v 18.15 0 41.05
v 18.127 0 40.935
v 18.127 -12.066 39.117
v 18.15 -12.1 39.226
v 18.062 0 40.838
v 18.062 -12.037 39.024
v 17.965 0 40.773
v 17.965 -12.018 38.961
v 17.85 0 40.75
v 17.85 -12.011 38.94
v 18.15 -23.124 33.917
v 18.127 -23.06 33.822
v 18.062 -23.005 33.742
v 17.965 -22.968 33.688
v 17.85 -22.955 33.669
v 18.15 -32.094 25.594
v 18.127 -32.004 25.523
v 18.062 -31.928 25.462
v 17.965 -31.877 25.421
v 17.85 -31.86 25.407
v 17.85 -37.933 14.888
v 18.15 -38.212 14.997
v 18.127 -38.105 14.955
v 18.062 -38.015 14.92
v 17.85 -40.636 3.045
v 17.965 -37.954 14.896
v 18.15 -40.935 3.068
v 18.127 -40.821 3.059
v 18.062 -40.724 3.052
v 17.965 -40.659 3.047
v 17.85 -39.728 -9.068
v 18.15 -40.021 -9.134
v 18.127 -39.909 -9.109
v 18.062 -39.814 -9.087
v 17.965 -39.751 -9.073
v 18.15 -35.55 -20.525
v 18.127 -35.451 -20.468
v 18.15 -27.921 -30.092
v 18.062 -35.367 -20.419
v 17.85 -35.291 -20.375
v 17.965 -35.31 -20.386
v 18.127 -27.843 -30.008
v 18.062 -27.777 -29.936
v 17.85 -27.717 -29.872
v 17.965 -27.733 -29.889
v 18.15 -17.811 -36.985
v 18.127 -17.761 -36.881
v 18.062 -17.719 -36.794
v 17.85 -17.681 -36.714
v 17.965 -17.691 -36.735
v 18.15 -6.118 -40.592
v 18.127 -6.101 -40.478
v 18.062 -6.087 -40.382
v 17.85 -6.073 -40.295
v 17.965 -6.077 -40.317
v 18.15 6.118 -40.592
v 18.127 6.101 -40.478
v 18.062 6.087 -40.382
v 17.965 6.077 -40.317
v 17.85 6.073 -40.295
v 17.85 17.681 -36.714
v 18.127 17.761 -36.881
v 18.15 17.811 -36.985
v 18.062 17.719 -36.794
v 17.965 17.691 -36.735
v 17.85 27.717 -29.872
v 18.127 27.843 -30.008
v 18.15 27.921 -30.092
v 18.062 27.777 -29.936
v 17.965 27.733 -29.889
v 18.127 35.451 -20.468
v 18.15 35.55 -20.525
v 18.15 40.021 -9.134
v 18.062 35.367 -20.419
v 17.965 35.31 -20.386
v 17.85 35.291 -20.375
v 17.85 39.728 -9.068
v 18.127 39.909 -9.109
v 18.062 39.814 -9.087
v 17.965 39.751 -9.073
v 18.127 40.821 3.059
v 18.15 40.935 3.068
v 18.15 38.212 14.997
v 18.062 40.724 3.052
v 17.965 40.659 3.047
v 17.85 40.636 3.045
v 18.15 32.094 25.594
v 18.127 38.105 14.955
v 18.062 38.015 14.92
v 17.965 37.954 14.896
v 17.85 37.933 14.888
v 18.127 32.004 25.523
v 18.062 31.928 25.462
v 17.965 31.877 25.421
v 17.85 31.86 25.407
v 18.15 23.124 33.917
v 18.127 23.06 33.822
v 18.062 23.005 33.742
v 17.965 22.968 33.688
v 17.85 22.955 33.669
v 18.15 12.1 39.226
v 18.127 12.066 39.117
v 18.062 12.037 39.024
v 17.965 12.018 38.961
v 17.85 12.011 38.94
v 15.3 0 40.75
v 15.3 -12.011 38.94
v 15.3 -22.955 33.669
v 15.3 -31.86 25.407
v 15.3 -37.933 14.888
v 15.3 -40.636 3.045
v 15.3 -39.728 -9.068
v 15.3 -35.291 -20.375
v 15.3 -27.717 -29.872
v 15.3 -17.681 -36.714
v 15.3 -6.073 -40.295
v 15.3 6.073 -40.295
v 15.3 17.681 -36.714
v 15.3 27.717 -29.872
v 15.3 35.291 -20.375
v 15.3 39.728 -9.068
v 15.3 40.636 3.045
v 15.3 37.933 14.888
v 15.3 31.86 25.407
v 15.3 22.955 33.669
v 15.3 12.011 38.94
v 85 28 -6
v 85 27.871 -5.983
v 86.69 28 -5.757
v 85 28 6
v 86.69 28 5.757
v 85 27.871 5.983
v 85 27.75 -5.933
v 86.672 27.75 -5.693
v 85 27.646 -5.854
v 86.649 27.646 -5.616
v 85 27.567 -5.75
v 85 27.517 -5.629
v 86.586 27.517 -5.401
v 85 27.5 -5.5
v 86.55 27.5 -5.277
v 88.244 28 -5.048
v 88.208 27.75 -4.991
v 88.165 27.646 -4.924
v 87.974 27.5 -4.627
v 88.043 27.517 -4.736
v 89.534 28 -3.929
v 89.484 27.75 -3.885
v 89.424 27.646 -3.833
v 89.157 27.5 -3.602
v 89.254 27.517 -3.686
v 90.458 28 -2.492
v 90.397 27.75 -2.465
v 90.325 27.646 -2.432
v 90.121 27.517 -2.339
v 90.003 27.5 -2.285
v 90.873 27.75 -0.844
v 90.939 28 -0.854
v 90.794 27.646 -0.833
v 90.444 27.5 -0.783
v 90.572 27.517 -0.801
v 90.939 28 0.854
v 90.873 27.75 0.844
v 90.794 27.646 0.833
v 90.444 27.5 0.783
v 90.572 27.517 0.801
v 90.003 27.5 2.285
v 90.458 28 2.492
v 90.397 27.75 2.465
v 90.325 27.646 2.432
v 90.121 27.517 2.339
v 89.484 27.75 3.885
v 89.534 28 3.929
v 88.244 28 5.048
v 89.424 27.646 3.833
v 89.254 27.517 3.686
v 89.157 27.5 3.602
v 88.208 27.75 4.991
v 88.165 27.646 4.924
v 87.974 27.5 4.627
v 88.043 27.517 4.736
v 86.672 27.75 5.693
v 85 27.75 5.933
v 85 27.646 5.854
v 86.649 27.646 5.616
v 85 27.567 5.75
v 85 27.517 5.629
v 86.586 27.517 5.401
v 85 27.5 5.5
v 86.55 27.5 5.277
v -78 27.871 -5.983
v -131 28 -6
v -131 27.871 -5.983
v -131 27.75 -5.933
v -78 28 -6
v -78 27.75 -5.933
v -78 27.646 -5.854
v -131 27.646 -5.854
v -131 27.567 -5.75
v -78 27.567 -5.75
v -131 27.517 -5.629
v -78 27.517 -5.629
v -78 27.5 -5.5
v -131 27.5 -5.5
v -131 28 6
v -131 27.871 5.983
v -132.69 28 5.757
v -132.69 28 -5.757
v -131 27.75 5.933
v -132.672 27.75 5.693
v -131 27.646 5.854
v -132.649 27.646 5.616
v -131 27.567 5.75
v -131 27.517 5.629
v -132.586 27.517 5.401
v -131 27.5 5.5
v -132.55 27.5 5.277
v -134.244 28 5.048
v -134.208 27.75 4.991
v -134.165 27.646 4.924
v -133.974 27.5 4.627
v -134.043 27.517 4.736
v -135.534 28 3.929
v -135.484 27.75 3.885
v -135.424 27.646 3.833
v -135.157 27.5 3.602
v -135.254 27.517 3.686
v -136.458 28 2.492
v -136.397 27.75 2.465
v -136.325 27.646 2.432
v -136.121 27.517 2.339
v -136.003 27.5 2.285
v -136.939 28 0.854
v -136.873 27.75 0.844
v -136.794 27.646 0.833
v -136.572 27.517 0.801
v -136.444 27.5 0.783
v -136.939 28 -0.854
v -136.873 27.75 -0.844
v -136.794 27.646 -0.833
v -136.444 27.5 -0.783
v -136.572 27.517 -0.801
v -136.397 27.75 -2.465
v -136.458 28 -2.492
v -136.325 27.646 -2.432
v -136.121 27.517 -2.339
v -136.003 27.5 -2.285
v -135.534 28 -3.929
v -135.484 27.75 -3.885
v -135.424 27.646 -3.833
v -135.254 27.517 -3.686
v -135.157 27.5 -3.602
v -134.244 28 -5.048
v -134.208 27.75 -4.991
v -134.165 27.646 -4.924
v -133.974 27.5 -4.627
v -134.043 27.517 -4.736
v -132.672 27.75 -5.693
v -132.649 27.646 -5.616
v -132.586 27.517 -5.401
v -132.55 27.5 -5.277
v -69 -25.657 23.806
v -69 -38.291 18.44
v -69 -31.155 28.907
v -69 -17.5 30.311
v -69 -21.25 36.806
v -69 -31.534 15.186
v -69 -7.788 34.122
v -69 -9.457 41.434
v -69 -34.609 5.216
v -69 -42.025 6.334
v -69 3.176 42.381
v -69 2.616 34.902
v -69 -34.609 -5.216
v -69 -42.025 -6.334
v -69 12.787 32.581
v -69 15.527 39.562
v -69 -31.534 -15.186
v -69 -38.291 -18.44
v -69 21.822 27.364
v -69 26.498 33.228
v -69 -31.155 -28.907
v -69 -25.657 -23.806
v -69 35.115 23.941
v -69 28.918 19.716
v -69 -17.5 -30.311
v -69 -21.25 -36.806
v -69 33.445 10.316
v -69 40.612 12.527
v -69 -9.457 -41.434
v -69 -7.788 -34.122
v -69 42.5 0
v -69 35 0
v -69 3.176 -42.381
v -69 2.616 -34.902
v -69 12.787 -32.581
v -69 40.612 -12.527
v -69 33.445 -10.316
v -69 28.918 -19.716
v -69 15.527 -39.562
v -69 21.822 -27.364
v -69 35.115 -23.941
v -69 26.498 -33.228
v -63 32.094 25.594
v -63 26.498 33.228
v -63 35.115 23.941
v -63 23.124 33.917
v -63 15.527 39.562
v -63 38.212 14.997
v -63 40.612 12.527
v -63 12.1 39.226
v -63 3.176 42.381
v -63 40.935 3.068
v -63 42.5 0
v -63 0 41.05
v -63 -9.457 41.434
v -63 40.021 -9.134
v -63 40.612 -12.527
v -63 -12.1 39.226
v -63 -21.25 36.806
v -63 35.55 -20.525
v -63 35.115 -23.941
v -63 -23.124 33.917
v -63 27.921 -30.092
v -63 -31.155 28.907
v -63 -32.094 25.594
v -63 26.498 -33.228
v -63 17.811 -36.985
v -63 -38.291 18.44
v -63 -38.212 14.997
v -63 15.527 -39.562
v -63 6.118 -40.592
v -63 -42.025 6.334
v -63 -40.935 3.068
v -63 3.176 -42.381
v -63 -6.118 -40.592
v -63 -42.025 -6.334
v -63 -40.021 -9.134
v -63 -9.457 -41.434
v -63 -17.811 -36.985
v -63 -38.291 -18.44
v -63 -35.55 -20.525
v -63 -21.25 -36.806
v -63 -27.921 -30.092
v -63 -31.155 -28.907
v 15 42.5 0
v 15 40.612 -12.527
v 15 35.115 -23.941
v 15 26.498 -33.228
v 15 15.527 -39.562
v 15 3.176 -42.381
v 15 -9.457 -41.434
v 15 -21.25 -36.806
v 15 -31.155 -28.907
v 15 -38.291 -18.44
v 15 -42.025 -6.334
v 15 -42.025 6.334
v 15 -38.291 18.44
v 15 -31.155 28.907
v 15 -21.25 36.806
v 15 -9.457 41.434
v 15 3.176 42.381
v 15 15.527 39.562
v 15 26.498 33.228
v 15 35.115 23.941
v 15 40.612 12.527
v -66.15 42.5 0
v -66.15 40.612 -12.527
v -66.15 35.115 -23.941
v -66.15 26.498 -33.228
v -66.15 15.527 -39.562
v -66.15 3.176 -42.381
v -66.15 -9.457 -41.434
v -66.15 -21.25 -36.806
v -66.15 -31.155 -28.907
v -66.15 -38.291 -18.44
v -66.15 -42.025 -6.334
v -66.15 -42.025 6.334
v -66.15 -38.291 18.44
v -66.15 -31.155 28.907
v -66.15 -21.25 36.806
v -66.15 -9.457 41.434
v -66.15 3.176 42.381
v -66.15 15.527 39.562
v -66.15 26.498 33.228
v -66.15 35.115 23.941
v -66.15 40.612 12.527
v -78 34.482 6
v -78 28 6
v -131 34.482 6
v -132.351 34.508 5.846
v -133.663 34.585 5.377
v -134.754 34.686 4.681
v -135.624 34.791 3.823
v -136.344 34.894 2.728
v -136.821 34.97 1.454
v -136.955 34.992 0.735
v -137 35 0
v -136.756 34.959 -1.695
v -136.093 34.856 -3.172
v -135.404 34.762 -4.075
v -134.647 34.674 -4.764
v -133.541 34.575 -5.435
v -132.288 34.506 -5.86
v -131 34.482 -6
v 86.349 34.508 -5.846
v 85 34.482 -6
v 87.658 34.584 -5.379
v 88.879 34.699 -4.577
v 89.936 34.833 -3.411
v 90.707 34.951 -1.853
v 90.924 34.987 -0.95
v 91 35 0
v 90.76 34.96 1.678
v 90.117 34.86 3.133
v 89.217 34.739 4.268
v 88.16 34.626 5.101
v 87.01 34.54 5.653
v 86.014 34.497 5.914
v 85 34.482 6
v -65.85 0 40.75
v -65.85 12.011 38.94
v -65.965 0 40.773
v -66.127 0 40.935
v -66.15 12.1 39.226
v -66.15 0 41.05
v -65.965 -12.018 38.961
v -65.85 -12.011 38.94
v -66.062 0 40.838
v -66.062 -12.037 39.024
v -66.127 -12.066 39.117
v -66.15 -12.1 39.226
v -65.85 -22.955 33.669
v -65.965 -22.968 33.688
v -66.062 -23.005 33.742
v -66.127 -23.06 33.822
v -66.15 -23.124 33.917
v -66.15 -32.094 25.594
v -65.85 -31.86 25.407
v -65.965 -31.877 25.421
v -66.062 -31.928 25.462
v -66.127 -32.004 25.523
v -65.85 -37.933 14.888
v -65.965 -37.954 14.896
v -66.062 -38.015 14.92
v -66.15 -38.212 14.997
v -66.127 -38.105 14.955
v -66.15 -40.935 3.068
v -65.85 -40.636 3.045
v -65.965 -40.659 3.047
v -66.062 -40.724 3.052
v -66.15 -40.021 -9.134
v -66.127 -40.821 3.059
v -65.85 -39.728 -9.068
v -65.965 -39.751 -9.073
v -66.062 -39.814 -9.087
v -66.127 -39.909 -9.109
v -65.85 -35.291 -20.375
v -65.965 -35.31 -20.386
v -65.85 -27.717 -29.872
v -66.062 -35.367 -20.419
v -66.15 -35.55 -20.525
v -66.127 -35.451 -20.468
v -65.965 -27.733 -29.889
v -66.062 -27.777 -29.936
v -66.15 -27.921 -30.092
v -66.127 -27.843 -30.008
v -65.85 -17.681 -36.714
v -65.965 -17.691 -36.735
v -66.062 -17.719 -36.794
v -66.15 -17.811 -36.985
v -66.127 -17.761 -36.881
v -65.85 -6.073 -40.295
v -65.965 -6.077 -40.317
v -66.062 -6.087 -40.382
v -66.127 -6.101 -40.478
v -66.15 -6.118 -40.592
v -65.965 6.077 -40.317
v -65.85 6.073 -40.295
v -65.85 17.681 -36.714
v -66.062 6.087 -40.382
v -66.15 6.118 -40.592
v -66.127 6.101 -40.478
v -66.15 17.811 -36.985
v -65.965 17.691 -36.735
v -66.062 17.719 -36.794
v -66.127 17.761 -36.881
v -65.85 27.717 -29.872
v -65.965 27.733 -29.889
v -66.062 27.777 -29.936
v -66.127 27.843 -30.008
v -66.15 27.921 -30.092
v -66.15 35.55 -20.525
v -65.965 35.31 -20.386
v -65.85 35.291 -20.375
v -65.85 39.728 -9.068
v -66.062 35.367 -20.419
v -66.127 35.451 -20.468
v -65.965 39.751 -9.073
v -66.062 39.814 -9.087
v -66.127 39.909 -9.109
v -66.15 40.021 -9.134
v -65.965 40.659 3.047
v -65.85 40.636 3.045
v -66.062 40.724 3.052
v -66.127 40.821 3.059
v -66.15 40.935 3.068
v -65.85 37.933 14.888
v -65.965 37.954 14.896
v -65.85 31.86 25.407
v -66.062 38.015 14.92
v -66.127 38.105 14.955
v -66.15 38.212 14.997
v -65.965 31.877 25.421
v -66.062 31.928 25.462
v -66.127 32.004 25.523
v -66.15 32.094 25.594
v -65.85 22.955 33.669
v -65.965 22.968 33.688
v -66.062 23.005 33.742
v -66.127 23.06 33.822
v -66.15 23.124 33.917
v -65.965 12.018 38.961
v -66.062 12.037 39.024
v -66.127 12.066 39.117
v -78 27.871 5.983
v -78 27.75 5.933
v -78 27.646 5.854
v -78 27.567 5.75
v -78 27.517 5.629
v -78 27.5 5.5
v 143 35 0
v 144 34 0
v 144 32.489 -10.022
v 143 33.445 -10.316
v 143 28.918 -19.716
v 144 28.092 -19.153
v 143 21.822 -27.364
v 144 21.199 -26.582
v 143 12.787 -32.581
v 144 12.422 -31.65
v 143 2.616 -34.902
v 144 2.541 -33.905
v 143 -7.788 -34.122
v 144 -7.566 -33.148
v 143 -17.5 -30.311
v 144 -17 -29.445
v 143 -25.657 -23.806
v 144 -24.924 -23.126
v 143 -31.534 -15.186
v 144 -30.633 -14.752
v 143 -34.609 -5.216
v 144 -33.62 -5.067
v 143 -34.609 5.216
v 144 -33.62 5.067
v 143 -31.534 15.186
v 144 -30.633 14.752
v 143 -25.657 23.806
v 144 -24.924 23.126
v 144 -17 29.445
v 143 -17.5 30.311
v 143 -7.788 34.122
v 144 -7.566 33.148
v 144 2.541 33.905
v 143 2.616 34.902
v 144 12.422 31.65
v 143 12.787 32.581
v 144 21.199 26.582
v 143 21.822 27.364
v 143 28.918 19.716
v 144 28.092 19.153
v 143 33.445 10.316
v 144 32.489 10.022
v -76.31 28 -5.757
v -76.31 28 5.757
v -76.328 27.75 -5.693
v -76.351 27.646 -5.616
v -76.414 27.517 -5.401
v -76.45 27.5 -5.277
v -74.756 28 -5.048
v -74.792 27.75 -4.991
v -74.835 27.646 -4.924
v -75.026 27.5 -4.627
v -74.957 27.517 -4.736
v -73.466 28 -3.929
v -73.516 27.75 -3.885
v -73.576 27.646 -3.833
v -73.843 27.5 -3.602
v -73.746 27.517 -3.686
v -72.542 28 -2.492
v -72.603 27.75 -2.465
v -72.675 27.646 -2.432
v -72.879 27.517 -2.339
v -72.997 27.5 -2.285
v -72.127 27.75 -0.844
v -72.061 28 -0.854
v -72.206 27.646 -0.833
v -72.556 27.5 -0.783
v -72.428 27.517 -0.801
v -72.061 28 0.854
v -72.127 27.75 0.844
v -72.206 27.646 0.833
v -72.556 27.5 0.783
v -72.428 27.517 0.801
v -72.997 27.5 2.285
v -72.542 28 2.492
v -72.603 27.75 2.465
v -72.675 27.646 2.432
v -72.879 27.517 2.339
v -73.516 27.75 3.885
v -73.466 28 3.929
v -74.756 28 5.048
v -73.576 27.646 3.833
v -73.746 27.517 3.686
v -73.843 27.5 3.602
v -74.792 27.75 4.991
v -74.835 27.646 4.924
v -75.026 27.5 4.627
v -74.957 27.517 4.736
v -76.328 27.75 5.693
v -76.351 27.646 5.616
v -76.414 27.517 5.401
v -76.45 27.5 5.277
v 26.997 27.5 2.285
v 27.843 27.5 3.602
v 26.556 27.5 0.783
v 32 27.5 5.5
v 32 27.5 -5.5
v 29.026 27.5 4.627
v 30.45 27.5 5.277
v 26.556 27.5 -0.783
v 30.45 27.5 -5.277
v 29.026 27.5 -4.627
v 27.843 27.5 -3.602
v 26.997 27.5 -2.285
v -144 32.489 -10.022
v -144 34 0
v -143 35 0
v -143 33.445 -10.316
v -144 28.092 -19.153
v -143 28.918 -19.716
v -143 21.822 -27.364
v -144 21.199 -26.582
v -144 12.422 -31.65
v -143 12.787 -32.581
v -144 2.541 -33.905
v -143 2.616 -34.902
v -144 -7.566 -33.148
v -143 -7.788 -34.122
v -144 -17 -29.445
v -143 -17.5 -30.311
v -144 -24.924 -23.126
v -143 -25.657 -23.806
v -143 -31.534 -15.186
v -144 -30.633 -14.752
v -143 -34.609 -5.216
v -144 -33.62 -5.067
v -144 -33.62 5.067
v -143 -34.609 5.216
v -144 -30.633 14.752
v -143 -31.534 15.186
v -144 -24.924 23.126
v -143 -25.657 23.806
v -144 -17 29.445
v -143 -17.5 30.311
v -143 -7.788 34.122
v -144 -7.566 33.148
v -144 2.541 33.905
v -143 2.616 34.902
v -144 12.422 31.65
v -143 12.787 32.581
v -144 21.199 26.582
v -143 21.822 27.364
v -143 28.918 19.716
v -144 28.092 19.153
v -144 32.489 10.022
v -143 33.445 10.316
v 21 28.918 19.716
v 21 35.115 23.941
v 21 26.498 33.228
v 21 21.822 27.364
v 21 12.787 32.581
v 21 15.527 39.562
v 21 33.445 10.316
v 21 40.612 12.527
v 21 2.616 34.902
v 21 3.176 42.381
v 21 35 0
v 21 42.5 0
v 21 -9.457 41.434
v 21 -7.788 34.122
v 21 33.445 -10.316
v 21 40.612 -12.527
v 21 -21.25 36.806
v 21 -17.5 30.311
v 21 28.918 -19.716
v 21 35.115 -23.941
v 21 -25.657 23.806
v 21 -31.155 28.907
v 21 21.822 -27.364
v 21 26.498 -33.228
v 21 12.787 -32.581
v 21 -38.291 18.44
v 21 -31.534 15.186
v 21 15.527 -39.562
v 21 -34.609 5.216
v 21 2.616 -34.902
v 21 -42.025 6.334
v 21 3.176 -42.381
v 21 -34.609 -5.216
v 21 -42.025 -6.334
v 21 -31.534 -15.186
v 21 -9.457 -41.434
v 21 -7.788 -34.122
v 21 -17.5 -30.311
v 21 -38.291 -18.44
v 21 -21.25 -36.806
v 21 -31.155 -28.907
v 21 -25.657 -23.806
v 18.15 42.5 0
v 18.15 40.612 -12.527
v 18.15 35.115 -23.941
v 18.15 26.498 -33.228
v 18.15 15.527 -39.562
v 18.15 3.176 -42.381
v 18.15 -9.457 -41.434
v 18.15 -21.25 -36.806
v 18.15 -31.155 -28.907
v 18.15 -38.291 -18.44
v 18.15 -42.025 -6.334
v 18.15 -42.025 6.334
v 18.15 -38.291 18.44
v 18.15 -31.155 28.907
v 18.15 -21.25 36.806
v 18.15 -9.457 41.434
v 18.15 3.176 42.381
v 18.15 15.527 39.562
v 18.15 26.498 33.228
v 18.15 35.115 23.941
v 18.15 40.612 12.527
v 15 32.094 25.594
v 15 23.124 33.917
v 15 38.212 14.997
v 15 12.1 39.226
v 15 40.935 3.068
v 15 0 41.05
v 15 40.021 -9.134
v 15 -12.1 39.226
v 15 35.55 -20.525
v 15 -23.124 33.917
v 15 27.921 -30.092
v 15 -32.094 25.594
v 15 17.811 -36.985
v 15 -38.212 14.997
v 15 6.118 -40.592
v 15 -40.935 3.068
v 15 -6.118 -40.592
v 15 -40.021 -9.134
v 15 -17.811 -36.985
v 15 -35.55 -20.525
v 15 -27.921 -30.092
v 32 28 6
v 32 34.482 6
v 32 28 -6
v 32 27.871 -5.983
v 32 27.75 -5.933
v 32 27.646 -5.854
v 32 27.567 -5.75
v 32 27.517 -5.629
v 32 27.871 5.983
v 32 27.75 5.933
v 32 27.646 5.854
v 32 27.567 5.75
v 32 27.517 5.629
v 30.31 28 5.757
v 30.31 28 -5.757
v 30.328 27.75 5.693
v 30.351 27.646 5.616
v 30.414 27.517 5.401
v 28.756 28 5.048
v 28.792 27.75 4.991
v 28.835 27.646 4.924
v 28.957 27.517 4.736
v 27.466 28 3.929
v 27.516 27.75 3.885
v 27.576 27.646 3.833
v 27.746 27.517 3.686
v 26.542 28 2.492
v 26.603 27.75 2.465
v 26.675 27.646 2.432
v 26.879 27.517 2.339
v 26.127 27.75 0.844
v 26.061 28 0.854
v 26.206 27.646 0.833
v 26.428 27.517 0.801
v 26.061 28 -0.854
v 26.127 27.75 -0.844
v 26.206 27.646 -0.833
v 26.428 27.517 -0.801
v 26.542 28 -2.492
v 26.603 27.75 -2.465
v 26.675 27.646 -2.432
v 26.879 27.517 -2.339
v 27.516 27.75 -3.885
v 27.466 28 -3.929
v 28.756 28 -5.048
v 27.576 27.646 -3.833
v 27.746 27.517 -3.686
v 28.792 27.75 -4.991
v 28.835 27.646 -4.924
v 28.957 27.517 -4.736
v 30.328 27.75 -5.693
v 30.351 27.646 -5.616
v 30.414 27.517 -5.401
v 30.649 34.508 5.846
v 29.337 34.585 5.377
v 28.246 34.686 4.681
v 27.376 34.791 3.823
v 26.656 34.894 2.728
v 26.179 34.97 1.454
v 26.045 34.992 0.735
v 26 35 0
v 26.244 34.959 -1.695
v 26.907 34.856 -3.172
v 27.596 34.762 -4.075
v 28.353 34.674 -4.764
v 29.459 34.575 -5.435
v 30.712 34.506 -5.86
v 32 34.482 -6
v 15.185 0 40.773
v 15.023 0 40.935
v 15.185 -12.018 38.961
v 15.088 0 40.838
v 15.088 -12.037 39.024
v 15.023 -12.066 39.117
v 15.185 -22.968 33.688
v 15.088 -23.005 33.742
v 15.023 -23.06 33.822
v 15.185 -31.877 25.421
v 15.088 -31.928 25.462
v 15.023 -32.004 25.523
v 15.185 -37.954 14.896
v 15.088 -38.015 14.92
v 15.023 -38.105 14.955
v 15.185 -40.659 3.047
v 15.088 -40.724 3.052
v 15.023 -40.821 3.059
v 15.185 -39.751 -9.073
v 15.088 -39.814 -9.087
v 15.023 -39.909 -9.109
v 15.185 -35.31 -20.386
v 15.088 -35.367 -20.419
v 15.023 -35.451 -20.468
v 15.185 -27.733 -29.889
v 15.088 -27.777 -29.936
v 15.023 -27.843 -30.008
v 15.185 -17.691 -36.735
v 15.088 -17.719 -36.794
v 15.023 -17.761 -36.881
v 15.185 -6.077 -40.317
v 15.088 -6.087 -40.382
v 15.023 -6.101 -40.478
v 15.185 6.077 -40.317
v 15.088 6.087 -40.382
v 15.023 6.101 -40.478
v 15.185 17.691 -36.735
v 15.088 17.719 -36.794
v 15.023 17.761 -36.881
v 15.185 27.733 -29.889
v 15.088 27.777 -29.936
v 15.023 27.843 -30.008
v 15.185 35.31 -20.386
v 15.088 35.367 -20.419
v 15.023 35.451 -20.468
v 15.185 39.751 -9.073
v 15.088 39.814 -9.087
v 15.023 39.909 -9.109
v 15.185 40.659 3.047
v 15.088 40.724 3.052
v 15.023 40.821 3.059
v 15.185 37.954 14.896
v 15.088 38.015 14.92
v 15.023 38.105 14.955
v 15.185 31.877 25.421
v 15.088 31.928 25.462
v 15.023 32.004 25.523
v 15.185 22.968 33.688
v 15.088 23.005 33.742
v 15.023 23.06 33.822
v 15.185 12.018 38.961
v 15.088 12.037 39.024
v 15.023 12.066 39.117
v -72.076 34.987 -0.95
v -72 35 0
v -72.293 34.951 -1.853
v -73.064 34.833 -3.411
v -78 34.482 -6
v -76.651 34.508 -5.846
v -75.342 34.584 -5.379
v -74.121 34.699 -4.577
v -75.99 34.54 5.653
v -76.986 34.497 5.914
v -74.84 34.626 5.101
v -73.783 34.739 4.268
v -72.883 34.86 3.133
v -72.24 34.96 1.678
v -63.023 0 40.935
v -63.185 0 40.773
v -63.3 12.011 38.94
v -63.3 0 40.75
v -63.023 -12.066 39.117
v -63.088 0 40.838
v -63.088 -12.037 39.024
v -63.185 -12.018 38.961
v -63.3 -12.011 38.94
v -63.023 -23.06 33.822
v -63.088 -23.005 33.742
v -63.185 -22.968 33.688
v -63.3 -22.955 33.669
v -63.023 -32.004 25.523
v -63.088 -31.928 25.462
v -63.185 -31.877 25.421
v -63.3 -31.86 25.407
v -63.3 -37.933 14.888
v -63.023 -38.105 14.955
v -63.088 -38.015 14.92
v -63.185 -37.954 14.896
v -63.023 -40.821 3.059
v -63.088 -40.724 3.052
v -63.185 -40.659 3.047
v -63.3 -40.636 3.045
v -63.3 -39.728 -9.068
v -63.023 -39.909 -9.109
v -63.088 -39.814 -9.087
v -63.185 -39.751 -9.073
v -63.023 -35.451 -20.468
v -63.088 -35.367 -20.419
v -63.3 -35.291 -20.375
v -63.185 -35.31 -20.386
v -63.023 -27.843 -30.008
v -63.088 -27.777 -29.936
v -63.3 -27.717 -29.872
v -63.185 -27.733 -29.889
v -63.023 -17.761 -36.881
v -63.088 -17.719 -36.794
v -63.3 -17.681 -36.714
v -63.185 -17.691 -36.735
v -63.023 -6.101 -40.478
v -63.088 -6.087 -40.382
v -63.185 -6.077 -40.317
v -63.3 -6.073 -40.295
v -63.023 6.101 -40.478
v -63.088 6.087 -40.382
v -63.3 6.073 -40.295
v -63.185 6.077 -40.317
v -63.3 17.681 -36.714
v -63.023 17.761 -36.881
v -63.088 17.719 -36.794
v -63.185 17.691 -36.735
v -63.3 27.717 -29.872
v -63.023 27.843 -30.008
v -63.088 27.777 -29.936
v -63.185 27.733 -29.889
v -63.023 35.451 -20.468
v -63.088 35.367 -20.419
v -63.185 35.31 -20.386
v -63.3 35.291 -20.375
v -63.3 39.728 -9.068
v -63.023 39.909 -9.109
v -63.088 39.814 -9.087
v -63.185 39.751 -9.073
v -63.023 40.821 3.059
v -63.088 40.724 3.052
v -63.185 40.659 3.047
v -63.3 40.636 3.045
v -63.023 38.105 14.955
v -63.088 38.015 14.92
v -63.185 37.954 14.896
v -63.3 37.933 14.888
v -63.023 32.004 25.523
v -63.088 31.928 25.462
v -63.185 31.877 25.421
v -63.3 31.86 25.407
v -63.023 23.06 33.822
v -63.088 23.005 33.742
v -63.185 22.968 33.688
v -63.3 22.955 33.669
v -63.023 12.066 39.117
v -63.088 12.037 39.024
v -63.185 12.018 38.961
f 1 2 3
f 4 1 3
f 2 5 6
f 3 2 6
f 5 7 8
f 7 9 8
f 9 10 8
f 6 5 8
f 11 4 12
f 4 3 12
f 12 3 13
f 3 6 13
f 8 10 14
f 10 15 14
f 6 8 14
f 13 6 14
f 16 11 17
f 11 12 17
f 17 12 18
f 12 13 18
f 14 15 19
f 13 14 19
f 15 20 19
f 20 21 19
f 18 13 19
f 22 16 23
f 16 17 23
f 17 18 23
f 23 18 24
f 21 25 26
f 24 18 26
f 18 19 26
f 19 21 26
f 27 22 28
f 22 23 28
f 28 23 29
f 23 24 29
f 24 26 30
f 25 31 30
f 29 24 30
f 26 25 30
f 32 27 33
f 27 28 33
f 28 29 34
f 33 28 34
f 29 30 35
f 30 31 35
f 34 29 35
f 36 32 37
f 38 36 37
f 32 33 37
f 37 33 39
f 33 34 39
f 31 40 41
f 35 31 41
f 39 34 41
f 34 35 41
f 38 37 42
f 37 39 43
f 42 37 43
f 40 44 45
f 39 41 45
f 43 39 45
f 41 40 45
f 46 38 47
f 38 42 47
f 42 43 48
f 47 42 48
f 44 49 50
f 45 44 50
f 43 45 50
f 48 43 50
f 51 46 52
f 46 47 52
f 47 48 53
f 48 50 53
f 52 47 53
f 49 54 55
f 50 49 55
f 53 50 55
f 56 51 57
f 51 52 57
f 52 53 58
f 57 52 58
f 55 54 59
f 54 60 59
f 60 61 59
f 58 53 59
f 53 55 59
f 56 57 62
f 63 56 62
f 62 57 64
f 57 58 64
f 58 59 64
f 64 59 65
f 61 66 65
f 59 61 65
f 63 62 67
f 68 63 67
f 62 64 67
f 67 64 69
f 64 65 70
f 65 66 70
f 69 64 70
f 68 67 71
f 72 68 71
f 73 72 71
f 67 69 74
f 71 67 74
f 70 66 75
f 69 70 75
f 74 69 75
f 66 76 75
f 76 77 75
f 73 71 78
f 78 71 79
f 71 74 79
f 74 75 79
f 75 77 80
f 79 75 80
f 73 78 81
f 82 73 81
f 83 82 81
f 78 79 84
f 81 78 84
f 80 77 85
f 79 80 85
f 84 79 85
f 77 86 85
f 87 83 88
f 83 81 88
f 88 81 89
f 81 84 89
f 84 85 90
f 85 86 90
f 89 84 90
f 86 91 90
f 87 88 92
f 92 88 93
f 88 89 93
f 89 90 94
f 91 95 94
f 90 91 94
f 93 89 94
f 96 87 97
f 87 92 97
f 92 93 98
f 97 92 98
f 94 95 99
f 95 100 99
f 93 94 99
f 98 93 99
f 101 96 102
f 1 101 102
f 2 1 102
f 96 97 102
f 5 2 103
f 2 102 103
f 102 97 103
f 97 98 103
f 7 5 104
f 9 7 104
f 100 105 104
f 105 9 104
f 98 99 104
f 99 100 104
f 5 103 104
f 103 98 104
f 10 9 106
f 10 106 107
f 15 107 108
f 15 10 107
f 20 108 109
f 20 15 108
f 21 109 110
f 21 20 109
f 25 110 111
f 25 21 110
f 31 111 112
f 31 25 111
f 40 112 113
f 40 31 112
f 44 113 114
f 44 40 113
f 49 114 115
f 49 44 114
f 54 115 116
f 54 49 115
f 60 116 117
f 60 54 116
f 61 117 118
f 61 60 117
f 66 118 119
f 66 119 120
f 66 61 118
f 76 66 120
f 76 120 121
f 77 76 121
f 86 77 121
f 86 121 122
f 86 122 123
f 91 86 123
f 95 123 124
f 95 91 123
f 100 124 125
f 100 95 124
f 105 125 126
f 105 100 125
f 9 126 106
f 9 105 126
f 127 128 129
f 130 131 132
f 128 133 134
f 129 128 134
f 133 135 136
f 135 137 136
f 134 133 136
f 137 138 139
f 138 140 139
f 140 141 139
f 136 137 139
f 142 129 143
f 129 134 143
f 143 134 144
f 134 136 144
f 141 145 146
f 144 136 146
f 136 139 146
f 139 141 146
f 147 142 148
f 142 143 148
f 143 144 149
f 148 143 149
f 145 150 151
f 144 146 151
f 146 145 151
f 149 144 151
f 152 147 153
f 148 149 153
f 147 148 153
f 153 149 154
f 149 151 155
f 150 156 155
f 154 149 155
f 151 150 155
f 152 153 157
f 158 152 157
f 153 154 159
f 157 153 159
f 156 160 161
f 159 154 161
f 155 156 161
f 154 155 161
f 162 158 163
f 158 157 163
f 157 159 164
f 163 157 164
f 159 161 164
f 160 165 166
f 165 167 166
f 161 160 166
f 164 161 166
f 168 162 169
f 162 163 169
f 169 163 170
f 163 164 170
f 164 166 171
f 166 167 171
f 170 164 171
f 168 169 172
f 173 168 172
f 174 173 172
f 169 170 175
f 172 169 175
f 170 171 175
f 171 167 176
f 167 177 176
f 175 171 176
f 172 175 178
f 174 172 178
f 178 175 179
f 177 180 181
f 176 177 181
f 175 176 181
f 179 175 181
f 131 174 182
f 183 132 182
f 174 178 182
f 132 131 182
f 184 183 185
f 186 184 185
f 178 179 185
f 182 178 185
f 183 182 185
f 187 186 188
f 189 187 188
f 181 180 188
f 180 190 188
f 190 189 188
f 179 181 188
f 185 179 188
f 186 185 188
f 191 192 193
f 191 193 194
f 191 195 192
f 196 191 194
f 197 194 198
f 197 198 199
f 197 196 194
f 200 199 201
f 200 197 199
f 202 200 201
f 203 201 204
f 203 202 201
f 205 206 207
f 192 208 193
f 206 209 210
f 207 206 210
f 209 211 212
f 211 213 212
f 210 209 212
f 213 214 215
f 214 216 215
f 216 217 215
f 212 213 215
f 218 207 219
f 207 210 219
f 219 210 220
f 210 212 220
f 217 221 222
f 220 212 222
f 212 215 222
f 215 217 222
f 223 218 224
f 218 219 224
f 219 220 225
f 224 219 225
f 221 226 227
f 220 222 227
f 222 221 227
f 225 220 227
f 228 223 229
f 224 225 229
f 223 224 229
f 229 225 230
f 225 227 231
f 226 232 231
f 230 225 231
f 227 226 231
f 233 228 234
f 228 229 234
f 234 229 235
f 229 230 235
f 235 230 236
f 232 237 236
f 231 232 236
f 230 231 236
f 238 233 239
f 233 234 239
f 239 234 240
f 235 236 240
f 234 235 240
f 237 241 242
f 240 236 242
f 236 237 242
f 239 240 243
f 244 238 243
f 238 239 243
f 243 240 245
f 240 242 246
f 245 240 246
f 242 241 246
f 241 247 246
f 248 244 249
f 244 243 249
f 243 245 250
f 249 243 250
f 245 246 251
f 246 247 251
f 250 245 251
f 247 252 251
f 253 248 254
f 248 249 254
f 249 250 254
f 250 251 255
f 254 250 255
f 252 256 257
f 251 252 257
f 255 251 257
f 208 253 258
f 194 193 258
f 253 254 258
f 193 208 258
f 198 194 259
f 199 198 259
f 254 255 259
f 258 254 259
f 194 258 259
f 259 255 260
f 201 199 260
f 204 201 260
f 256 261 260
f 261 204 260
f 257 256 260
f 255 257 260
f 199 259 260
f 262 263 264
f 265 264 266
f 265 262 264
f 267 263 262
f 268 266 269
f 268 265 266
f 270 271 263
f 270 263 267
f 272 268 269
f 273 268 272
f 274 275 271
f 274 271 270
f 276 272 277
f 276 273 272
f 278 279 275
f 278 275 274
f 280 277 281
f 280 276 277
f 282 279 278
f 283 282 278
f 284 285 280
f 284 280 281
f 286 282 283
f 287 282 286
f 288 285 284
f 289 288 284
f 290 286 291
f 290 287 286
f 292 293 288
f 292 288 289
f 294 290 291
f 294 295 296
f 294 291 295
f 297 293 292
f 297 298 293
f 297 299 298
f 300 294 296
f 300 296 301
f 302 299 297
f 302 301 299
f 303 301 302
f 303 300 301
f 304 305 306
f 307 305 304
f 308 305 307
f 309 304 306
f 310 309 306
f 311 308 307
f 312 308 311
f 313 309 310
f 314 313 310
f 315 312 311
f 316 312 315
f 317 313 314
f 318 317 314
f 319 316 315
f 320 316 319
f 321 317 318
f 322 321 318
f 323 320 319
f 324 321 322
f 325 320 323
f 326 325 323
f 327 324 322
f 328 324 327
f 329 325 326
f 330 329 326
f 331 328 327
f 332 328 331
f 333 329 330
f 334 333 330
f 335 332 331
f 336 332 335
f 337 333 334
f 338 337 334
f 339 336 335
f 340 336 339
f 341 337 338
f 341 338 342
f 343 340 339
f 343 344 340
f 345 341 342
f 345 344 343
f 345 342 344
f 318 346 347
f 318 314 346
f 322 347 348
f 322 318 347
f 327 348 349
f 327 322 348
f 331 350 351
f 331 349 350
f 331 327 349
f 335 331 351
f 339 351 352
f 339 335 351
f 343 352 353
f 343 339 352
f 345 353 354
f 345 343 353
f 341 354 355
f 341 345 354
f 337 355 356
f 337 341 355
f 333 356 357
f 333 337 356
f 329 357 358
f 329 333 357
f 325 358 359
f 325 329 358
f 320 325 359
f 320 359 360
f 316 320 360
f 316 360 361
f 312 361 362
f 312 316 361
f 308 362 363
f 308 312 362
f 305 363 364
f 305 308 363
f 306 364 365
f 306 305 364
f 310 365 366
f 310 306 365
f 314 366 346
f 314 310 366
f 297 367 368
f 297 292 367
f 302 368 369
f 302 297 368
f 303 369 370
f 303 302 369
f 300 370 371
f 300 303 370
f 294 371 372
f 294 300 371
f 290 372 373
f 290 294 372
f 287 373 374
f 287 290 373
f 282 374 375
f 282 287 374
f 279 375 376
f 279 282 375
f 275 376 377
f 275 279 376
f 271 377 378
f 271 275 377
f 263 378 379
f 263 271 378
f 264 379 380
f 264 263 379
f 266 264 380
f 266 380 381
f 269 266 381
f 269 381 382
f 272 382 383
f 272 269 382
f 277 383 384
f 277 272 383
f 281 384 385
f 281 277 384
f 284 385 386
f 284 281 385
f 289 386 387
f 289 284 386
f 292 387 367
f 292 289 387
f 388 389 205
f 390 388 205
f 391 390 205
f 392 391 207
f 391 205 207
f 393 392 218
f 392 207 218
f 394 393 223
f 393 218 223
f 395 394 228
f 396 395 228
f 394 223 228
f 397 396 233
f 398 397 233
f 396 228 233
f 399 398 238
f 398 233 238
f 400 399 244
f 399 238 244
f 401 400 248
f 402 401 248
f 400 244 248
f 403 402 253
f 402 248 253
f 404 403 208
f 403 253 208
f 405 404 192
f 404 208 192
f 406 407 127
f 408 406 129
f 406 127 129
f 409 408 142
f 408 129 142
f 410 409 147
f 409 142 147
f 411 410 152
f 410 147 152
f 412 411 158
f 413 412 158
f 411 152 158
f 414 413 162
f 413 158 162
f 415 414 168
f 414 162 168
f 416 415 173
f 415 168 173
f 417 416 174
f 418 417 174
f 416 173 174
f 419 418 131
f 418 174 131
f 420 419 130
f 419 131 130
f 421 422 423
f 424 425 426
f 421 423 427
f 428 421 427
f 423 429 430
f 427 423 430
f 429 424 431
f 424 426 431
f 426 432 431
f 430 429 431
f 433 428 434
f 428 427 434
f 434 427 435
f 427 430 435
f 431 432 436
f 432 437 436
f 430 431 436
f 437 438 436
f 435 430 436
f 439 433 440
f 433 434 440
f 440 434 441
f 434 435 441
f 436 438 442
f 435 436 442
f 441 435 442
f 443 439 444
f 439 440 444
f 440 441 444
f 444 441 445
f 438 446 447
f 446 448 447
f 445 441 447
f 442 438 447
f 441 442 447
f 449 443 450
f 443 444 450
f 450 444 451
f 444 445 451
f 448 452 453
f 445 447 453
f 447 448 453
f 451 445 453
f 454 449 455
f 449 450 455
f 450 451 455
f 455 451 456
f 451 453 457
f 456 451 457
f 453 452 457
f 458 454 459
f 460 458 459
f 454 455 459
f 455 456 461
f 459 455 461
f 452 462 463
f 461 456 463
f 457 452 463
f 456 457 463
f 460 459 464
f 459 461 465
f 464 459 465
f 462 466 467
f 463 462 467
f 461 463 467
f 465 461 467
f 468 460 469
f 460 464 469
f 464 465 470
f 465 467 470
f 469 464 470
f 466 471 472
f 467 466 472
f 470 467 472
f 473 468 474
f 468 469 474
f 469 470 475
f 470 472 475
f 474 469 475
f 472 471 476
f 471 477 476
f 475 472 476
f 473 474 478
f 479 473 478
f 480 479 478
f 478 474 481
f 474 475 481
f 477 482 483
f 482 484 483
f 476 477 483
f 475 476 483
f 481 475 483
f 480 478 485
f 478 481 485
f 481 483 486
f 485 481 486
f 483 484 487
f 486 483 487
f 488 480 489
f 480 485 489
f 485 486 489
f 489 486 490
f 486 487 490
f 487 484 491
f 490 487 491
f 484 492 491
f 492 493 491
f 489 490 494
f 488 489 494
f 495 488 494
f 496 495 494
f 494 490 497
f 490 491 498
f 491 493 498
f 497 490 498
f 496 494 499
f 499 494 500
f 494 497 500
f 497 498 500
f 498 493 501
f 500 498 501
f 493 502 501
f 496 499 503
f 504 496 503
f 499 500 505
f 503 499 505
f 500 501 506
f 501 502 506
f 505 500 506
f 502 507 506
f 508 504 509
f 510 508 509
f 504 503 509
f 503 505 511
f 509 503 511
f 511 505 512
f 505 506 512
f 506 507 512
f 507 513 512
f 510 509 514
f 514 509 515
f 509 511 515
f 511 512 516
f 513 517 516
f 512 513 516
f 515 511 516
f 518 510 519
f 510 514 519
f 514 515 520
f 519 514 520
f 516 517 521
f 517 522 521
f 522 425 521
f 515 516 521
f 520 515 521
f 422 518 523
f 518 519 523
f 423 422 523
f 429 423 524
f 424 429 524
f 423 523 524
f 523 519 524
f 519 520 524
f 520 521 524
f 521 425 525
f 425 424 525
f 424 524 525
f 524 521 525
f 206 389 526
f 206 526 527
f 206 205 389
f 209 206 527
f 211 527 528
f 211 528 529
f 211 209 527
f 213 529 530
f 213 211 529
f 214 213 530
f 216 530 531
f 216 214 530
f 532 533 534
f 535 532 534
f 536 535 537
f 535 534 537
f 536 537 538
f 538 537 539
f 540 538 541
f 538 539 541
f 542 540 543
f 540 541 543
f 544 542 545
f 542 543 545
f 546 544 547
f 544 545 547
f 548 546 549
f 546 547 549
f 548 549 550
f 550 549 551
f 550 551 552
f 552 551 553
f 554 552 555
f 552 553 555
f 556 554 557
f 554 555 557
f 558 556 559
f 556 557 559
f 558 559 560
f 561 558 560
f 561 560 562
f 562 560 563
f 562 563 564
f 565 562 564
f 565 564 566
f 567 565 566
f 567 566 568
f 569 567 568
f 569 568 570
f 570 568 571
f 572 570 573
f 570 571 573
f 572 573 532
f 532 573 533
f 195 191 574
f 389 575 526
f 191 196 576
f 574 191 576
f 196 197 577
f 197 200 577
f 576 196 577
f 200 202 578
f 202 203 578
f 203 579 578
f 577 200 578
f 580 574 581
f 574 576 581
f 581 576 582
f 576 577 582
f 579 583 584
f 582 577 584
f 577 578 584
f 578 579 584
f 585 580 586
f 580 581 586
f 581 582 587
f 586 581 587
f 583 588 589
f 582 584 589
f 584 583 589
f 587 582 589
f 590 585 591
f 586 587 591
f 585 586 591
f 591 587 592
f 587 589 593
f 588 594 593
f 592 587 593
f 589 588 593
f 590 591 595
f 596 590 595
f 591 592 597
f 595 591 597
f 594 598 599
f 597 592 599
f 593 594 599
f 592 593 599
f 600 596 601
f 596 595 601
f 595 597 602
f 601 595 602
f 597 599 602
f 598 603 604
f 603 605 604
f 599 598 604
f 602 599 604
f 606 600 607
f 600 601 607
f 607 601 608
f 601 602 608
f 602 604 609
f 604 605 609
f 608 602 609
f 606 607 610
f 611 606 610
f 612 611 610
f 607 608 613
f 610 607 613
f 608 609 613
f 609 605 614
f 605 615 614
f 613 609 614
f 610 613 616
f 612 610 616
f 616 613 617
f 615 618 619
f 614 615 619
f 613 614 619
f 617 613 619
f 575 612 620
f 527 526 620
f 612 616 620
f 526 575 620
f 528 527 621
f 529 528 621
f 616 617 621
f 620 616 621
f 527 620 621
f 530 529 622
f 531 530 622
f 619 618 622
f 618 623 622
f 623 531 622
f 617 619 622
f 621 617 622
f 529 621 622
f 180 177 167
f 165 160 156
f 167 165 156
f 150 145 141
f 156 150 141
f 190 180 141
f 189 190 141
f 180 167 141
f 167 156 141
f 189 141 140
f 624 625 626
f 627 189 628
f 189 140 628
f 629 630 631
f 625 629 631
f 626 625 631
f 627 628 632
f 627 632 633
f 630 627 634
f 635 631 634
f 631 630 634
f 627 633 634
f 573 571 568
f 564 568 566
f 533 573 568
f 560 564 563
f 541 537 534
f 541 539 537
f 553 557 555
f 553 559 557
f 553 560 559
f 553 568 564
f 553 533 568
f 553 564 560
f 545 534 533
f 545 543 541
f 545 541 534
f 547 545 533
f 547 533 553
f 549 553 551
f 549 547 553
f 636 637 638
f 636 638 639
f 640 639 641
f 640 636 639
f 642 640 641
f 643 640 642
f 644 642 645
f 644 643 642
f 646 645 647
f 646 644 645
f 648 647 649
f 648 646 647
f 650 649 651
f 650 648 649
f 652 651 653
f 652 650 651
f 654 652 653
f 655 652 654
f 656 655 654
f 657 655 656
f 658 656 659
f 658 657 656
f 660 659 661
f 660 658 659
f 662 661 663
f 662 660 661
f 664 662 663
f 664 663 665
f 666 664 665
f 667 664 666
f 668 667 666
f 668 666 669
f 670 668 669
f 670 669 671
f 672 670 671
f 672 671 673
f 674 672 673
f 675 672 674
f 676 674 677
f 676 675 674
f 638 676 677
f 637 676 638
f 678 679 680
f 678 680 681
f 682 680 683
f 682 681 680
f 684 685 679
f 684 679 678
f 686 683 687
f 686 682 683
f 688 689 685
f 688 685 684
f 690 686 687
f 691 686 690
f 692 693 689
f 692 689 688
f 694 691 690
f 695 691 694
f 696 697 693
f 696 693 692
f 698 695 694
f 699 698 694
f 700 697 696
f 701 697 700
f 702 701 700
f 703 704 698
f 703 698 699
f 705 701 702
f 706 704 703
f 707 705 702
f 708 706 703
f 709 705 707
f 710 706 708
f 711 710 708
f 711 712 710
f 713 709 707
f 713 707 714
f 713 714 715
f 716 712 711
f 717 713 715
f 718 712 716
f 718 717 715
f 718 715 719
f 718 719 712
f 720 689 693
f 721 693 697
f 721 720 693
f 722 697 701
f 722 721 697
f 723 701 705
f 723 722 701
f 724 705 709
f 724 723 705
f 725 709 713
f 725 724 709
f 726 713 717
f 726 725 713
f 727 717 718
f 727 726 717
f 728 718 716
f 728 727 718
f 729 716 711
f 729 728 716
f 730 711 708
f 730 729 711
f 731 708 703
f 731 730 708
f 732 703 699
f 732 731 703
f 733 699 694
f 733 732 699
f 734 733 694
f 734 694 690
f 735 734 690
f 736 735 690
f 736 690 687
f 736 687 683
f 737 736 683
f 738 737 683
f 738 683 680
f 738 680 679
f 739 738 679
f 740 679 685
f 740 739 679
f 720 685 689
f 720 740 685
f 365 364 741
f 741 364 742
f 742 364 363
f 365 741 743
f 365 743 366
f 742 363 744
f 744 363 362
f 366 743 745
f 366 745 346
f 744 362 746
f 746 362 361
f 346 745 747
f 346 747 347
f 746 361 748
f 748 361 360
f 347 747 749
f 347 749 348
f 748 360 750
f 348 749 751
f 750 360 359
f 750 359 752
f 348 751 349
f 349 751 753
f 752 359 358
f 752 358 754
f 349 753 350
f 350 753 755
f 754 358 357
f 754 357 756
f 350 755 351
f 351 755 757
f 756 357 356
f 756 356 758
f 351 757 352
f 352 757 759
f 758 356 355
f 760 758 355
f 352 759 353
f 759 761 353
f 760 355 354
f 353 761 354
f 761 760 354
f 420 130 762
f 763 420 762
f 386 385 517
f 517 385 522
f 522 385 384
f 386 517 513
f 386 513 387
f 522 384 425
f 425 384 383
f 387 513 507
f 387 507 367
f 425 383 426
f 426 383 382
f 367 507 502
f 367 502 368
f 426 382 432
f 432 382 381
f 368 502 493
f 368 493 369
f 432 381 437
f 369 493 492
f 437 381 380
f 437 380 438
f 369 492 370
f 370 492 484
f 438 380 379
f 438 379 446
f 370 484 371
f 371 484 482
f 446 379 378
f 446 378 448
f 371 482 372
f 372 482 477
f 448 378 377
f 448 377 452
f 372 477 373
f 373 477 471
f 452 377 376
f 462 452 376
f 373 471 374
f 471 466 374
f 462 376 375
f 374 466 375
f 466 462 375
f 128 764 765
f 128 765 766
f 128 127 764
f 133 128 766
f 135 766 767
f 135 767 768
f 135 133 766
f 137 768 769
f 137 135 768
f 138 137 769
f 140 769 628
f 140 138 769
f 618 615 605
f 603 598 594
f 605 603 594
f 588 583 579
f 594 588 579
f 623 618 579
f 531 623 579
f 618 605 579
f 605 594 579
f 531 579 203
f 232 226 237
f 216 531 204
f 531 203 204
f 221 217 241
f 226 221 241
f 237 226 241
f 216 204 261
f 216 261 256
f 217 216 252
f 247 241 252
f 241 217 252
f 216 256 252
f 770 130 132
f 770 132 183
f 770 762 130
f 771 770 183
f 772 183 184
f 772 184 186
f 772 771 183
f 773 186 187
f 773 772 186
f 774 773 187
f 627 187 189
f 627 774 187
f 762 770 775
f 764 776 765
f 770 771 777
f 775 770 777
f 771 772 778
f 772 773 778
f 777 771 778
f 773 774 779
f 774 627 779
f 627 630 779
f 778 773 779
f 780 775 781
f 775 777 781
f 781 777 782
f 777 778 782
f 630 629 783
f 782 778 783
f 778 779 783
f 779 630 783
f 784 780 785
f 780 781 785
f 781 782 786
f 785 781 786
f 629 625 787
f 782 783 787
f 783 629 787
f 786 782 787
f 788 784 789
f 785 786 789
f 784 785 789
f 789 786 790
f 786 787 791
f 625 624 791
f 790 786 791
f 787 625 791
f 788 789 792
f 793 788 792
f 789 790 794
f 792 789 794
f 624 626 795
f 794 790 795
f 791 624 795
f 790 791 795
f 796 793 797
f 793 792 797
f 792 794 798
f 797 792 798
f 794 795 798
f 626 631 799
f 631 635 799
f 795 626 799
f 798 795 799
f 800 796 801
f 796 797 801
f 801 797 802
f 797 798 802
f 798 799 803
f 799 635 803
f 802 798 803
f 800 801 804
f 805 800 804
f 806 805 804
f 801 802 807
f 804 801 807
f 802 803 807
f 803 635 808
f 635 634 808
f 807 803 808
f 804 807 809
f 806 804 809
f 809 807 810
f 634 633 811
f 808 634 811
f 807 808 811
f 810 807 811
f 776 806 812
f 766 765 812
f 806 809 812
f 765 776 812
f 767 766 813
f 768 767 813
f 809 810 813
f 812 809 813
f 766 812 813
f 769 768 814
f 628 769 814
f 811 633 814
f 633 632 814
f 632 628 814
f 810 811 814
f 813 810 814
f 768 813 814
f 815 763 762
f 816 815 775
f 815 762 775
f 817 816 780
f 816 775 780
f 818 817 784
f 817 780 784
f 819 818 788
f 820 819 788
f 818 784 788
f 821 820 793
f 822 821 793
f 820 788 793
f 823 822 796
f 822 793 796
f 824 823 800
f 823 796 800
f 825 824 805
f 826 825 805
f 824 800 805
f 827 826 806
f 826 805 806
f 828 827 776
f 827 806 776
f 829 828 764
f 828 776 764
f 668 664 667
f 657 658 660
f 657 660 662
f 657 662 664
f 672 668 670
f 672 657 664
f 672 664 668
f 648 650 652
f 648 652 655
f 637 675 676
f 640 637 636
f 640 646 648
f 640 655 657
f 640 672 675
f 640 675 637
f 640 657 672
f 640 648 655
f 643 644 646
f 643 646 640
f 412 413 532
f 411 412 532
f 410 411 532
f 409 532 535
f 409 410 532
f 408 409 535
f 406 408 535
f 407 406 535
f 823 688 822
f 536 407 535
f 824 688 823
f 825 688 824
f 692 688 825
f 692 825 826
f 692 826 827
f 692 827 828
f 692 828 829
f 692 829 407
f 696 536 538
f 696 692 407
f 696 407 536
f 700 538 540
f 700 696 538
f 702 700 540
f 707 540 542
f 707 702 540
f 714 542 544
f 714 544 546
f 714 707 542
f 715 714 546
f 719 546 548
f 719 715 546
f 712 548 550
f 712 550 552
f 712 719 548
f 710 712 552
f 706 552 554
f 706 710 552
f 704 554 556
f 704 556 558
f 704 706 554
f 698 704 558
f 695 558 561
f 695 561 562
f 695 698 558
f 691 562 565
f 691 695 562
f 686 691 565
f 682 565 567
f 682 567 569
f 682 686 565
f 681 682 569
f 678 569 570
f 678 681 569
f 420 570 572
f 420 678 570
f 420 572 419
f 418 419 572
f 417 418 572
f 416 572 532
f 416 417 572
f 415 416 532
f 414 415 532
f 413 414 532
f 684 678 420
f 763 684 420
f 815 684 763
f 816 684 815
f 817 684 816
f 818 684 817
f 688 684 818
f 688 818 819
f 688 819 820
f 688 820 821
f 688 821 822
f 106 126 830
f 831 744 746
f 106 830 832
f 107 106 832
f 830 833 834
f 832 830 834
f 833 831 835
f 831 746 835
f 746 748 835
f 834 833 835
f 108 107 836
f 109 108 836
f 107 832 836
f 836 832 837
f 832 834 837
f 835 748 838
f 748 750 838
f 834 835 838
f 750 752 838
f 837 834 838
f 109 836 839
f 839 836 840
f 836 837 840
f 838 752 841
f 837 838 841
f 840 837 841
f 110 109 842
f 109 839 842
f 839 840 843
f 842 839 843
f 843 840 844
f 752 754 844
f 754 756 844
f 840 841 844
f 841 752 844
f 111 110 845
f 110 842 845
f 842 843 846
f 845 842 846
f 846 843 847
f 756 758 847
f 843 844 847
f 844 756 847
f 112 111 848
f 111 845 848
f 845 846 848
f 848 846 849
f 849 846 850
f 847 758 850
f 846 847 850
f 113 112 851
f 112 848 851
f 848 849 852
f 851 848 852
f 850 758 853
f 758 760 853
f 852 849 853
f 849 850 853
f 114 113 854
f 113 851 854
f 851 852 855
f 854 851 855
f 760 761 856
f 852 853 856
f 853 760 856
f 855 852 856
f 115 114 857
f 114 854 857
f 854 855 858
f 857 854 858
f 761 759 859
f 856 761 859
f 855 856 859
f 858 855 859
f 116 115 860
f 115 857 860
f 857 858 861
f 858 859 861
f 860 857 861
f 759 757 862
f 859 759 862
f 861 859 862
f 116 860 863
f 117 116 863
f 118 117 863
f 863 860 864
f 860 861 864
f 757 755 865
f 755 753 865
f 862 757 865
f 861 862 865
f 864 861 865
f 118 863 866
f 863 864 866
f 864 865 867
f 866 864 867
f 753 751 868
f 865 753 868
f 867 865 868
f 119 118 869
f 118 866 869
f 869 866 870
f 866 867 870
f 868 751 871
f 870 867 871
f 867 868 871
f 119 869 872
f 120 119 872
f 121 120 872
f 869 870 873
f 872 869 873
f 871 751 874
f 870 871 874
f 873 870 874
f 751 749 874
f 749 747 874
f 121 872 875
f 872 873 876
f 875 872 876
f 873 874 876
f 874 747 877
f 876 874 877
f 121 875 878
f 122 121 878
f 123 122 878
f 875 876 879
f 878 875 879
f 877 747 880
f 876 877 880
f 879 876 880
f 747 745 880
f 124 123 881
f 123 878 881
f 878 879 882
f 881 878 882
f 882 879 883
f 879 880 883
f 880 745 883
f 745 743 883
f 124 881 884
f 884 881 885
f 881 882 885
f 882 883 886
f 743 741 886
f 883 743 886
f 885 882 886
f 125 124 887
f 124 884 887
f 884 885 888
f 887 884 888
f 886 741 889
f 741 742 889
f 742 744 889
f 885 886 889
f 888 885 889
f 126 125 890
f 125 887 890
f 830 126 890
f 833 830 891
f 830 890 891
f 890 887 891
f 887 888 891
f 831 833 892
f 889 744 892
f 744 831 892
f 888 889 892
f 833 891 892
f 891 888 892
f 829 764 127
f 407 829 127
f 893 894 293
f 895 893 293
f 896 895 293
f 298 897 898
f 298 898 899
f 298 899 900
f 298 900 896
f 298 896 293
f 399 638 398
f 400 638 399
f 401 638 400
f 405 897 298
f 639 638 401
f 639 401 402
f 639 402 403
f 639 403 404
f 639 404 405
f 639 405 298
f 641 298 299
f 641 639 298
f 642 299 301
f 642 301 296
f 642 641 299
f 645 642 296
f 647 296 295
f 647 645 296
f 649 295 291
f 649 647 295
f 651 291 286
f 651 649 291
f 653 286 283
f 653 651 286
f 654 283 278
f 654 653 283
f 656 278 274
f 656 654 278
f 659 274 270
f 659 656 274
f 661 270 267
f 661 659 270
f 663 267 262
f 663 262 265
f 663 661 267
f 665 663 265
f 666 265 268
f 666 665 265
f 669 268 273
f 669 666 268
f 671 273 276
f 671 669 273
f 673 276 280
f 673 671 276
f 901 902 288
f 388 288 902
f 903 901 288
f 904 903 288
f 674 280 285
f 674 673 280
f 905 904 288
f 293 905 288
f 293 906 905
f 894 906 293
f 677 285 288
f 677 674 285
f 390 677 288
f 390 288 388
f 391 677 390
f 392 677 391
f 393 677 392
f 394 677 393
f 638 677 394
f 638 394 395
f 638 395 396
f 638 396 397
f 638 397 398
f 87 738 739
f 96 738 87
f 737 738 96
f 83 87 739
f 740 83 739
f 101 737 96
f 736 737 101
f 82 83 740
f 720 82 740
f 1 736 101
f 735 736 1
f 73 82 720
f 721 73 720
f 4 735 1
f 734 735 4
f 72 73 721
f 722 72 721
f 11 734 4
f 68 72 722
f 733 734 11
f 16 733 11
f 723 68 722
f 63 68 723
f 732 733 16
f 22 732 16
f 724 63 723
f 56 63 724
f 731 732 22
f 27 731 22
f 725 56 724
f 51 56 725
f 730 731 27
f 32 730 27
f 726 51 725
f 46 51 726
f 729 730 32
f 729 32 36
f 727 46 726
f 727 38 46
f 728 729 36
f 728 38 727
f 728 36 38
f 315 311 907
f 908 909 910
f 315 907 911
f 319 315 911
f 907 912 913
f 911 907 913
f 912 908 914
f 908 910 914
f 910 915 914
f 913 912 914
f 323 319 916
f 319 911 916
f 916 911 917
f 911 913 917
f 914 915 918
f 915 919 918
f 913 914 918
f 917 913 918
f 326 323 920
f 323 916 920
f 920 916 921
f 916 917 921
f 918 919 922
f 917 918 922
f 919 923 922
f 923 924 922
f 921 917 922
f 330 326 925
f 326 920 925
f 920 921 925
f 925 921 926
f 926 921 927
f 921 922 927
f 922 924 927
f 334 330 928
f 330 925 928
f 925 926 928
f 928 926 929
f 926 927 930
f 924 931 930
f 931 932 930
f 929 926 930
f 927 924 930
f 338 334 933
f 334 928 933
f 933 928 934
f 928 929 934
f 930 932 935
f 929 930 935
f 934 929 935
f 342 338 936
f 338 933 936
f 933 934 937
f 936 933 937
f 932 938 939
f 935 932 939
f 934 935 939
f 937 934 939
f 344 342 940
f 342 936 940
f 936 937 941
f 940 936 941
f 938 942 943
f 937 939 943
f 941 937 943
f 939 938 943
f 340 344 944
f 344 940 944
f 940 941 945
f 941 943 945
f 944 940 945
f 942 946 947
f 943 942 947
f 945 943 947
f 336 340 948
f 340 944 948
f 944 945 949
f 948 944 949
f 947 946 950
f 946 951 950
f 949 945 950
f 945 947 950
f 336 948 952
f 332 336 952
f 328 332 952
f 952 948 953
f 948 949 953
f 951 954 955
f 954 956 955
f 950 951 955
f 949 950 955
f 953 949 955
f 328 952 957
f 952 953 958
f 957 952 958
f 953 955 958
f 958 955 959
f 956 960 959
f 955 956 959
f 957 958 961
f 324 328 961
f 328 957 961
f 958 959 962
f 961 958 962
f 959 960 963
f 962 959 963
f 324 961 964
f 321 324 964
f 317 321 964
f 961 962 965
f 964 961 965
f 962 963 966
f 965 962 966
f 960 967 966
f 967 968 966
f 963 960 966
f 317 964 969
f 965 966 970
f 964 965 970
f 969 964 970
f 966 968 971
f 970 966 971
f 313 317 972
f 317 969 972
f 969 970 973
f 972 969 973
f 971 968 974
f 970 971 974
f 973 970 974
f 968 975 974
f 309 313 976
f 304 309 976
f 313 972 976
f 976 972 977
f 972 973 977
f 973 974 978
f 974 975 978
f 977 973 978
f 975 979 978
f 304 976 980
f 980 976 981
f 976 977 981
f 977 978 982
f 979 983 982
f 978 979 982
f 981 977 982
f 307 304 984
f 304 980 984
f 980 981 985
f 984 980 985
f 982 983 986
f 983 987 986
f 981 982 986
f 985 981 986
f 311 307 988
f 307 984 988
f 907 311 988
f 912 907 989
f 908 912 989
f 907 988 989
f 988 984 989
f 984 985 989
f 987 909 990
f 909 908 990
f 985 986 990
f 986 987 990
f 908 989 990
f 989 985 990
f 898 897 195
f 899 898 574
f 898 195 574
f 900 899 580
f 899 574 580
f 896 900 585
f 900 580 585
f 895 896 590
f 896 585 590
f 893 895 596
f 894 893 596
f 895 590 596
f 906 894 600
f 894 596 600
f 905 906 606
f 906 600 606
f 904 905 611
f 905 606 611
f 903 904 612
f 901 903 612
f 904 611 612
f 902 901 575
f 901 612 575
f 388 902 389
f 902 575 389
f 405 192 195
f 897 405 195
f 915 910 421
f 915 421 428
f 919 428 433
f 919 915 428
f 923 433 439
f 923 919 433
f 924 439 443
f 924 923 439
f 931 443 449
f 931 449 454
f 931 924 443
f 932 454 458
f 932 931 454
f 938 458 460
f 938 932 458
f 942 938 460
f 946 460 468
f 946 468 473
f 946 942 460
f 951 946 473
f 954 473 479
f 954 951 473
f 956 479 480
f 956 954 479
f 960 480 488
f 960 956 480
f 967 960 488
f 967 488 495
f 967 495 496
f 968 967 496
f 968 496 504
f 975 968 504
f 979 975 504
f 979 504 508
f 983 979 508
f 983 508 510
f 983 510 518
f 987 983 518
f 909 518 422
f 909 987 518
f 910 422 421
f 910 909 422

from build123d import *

# Parameters (mm, degrees)
SKETCH3_W               = 3.15
SKETCH3_H               = 1.75
FILLET1_R               = 0.3
CHAMFER1_SIZE           = 1
CUT_EXTRUDE1_REACH      = 185.54
CUT_EXTRUDE1_END_RADIUS = 35
CUT_EXTRUDE1_START      = 27.5
FILLET2_R               = 0.5


with BuildPart() as part:
    # Sketch1 → Revolve1 (revolve)
    with BuildSketch(Plane.XY):
        Polygon((144, 0), (144, 35), (21, 35), (21, 42.5), (-69, 42.5), (-69, 35), (-144, 35), (-144, 0), align=None)
    revolve(axis=Axis((144, 0, 0), (-1, 0, 0)))

    # Sketch3 → Cut-Revolve4 (revolve, cut)
    with BuildSketch(Plane.XY, mode=Mode.PRIVATE) as cut_revolve4_sk:
        with Locations((-64.575, 41.625)):
            Rectangle(SKETCH3_W, SKETCH3_H)
        with Locations((16.575, 41.625)):
            Rectangle(SKETCH3_W, SKETCH3_H)
    revolve(cut_revolve4_sk.sketch.rotate(Axis((9.271510533, 0, 0), (1, 0, 0)), 90), axis=Axis((9.271510533, 0, 0), (1, 0, 0)), mode=Mode.SUBTRACT)

    # Fillet1
    fillet1_edges = [part.edges().sort_by_distance(p)[0] for p in [
        (-66.15, 0, -40.75),
        (-63, 0, -40.75),
        (15, 0, -40.75),
        (18.15, 0, -40.75),
    ]]
    fillet(fillet1_edges, radius=FILLET1_R)

    # Chamfer1
    chamfer1_edges = [part.edges().sort_by_distance(p)[0] for p in [
        (-144, -35, 0),
        (144, -35, 0),
    ]]
    chamfer(chamfer1_edges, length=CHAMFER1_SIZE)

    # Cut-Extrude1: up to this cylinder (the profile starts inside it)
    cut_extrude1_end = Plane(origin=(-23, 0, 0), z_dir=(1, 0, 0)) * Cylinder(CUT_EXTRUDE1_END_RADIUS, 605.08, mode=Mode.PRIVATE)
    # Sketch4 → Cut-Extrude1 (cut, up to the surface)
    with BuildSketch(Plane(origin=(0, 0, 0), x_dir=(1, 0, 0), z_dir=(0, 1, 0)).offset(CUT_EXTRUDE1_START), mode=Mode.PRIVATE) as cut_extrude1_sk1:
        with BuildLine():
            Line((32, 6), (85, 6))
            ThreePointArc((85, 6), (91, 0), (85, -6))
            Line((85, -6), (32, -6))
            ThreePointArc((32, -6), (26, 0), (32, 6))
        make_face()
    cut_extrude1_tool1 = extrude(cut_extrude1_sk1.sketch, amount=CUT_EXTRUDE1_REACH, mode=Mode.PRIVATE) & cut_extrude1_end
    add(cut_extrude1_tool1.solids().sort_by_distance((58.5, 27.5, 0))[0], mode=Mode.SUBTRACT)
    # Sketch4 → Cut-Extrude1 (cut, up to the surface)
    with BuildSketch(Plane(origin=(0, 0, 0), x_dir=(1, 0, 0), z_dir=(0, 1, 0)).offset(CUT_EXTRUDE1_START), mode=Mode.PRIVATE) as cut_extrude1_sk2:
        with BuildLine():
            Line((-131, 6), (-78, 6))
            ThreePointArc((-78, 6), (-72, 0), (-78, -6))
            Line((-78, -6), (-131, -6))
            ThreePointArc((-131, -6), (-137, 0), (-131, 6))
        make_face()
    cut_extrude1_tool2 = extrude(cut_extrude1_sk2.sketch, amount=CUT_EXTRUDE1_REACH, mode=Mode.PRIVATE) & cut_extrude1_end
    add(cut_extrude1_tool2.solids().sort_by_distance((-104.5, 27.5, 0))[0], mode=Mode.SUBTRACT)

    # Fillet2
    fillet2_edges = [part.edges().sort_by_distance(p)[0] for p in [
        (26, 27.5, 0),
        (58.5, 27.5, 6),
        (91, 27.5, 0),
        (58.5, 27.5, -6),
        (-137, 27.5, 0),
        (-104.5, 27.5, 6),
        (-72, 27.5, 0),
        (-104.5, 27.5, -6),
    ]]
    fillet(fillet2_edges, radius=FILLET2_R)


solid = part.part
